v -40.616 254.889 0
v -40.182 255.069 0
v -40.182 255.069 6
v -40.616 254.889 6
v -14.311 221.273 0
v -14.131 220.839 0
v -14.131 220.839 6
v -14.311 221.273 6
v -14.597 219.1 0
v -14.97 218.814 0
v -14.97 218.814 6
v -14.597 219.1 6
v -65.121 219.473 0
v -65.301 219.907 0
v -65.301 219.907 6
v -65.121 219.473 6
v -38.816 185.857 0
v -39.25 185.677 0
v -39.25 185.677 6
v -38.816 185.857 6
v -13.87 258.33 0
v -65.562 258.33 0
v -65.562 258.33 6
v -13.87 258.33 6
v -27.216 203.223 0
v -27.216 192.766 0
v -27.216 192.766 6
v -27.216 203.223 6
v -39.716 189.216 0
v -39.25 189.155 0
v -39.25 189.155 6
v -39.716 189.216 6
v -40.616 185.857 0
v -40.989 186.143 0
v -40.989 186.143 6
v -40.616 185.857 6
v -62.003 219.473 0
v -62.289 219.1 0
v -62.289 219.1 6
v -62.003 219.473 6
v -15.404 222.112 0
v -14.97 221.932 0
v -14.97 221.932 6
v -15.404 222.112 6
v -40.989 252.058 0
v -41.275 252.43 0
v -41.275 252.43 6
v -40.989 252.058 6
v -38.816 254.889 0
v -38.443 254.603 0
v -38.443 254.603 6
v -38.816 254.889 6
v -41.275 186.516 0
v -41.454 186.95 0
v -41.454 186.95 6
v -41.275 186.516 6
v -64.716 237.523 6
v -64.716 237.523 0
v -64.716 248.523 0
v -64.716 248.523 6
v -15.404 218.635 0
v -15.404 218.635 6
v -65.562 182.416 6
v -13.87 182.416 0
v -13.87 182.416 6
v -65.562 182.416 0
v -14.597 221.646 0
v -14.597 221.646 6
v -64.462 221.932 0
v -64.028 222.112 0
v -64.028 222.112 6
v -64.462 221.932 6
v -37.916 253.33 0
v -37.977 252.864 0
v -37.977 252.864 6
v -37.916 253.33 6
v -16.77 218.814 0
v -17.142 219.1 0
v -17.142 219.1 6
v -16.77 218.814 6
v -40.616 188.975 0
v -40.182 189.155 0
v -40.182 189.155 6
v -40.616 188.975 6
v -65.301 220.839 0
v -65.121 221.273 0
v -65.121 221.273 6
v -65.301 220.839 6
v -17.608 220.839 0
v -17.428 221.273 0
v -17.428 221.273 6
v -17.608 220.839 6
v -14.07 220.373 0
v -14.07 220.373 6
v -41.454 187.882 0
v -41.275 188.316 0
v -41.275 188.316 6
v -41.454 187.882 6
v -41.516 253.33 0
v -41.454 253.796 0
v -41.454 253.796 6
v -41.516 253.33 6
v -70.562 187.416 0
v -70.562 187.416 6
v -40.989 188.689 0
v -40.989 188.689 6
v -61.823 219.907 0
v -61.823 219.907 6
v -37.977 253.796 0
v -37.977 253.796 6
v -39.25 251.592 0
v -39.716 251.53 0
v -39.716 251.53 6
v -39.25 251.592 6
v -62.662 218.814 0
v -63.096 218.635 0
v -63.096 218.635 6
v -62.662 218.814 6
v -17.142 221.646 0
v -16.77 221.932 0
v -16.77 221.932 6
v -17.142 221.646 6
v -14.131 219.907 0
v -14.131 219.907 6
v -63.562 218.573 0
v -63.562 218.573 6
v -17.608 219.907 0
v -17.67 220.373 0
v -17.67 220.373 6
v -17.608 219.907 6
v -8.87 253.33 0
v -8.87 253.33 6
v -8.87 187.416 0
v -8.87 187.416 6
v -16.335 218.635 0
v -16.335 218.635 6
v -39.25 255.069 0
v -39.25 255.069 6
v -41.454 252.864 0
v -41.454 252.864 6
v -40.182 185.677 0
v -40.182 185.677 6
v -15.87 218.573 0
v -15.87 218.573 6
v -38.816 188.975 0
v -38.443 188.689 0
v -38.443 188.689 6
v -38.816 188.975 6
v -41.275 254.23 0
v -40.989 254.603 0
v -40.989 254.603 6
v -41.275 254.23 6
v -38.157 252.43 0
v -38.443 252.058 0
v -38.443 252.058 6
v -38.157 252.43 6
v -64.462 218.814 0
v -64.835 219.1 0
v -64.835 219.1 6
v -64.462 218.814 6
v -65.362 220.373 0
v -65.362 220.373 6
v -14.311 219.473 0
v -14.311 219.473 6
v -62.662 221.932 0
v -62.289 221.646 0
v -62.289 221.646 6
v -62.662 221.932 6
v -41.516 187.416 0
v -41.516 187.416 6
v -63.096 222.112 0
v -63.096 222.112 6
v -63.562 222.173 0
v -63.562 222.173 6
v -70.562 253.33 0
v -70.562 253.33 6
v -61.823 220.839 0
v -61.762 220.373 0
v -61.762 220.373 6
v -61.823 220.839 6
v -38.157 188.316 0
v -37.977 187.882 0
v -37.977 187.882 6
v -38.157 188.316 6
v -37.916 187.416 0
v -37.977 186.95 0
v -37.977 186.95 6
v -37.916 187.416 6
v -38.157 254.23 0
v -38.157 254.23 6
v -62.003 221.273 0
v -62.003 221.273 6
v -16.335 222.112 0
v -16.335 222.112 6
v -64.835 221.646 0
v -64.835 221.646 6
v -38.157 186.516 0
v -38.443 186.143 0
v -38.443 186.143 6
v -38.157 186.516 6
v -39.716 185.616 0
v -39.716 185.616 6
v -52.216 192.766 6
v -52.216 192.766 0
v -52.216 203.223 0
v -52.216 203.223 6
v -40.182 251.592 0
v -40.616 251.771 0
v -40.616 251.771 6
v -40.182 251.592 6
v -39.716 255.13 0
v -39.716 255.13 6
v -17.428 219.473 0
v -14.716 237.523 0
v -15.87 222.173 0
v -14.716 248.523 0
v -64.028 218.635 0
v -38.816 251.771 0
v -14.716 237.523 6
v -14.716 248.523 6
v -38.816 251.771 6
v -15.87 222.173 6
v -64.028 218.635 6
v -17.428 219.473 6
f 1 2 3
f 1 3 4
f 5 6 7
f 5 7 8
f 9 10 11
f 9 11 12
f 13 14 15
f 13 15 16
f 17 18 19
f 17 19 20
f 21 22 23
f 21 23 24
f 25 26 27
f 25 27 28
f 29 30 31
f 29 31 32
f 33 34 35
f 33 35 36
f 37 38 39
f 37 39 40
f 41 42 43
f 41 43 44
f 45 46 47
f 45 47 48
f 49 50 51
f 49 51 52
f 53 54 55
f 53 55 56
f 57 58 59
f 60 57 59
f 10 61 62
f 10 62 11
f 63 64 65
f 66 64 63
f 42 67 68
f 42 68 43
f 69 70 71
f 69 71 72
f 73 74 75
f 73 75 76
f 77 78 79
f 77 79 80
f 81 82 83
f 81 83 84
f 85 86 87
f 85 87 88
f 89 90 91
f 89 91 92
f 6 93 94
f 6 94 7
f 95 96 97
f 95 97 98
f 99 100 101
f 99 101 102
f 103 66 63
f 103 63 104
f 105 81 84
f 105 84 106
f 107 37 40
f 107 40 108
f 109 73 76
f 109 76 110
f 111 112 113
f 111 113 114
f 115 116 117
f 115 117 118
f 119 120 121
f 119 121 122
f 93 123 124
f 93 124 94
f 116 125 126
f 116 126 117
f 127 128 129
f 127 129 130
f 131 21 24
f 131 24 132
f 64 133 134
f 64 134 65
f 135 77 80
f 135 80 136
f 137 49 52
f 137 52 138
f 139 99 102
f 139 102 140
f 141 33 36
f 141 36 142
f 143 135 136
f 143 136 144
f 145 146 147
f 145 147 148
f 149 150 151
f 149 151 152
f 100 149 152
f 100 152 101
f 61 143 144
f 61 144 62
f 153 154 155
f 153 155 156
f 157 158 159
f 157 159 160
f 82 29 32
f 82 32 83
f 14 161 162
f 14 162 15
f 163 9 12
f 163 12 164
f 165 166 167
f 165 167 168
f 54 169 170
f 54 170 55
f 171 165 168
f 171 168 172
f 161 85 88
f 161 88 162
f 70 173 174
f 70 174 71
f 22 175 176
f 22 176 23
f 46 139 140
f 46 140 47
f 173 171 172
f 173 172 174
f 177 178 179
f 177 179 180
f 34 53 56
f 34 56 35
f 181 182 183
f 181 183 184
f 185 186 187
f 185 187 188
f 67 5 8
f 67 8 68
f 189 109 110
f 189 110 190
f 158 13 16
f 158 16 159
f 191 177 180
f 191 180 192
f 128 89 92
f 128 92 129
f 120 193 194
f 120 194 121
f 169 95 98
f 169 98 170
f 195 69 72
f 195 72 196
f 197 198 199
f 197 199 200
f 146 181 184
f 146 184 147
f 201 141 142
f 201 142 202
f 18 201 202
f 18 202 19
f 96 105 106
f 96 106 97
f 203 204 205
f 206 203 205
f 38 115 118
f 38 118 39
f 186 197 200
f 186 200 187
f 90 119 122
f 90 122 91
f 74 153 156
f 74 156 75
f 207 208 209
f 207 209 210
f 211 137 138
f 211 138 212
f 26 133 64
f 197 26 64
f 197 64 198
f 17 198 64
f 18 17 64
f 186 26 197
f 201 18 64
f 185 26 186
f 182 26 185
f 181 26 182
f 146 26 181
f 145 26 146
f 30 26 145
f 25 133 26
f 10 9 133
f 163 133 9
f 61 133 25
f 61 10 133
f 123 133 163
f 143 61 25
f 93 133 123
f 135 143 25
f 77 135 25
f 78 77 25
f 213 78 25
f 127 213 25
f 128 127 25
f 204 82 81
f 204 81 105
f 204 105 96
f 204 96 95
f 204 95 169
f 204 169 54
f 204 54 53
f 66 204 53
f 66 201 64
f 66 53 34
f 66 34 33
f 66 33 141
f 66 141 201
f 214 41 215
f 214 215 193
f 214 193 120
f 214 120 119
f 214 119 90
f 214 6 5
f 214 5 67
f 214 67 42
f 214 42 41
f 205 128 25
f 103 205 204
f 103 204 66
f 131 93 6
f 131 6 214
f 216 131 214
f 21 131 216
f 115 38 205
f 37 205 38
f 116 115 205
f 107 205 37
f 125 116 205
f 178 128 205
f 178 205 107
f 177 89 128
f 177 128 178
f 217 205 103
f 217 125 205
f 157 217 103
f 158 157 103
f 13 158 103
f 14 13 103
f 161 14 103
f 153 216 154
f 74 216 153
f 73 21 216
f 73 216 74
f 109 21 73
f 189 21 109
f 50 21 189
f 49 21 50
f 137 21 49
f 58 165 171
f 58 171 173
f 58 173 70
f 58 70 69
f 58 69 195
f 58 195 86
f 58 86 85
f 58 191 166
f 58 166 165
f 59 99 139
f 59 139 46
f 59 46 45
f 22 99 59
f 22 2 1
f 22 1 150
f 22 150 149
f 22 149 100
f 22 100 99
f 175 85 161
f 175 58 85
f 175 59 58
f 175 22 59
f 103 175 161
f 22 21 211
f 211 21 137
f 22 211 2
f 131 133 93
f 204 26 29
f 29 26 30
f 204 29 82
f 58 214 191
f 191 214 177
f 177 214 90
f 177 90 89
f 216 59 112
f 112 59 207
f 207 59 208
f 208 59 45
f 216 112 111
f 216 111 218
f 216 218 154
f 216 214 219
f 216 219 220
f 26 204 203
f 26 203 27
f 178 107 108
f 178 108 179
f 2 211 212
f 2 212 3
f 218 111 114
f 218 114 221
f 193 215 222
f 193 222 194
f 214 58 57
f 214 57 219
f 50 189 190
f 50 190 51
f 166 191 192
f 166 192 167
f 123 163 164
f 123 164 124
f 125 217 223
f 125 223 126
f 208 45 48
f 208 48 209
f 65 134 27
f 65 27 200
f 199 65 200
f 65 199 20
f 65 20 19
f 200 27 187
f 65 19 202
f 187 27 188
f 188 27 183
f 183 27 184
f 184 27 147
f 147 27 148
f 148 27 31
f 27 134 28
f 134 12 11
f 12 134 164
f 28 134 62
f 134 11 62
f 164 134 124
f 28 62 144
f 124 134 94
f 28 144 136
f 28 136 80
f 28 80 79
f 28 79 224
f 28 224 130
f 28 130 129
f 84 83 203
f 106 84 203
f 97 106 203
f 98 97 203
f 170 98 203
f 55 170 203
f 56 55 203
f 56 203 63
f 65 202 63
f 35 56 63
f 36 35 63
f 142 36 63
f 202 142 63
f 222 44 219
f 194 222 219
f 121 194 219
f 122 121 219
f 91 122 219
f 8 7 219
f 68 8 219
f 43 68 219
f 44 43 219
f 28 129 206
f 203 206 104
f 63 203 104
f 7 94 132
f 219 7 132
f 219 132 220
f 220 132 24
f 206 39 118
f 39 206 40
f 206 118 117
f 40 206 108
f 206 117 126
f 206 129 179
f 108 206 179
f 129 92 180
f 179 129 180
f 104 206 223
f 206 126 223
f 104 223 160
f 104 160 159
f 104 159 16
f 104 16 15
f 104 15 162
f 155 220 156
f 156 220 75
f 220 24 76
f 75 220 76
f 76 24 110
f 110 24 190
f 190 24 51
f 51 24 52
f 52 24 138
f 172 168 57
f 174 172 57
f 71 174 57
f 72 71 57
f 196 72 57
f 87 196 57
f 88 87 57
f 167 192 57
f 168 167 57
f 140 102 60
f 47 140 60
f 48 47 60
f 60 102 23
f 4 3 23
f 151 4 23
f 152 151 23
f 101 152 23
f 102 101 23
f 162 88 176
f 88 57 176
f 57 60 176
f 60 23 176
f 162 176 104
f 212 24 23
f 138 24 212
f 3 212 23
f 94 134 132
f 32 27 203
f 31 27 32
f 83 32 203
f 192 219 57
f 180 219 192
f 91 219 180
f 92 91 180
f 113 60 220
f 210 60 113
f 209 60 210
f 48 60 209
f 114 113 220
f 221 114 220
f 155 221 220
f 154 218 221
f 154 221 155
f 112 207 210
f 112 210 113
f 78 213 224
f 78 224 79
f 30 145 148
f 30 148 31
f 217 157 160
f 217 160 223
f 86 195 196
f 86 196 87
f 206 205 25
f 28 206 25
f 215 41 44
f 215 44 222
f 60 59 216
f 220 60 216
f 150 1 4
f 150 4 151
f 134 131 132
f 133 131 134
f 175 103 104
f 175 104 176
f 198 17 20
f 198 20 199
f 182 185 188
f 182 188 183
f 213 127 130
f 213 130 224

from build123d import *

# Parameters (mm, degrees)
SKETCH1_W           = 24.999989911
SKETCH1_H           = 10.457138346
SKETCH1_W_2         = 49.999979698
SKETCH1_H_2         = 10.999995004
BOSS_EXTRUDE1_DEPTH = 6


with BuildPart() as part:
    # Sketch1 → Boss-Extrude1 (new body)
    with BuildSketch(Plane.XY):
        Polygon((-13.869587182, 182.416079474), (-65.562023318, 182.416079474), (-70.562021318, 187.416077474), (-70.562021318, 253.330336135), (-65.562023318, 258.330334135), (-13.869587203, 258.330334135), (-8.86958931, 253.330336243), (-8.869589201, 187.416077455), align=None)
        with Locations((-39.715805198, 197.994644352)):
            Rectangle(SKETCH1_W, SKETCH1_H, mode=Mode.SUBTRACT)
        with Locations((-39.71580491, 243.023197048)):
            Rectangle(SKETCH1_W_2, SKETCH1_H_2, mode=Mode.SUBTRACT)
        Polygon((-64.027895433, 218.634541052), (-63.562021338, 218.573207564), (-63.096147243, 218.634541052), (-62.662021698, 218.81436174), (-62.289229641, 219.100415147), (-62.003176235, 219.473207204), (-61.823355546, 219.907332749), (-61.762022058, 220.373206844), (-61.823355546, 220.839080938), (-62.003176235, 221.273206484), (-62.289229641, 221.645998541), (-62.662021698, 221.932051947), (-63.096147243, 222.111872635), (-63.562021338, 222.173206124), (-64.027895433, 222.111872635), (-64.462020978, 221.932051947), (-64.834813035, 221.645998541), (-65.120866442, 221.273206484), (-65.30068713, 220.839080938), (-65.362020618, 220.373206844), (-65.30068713, 219.907332749), (-65.120866442, 219.473207204), (-64.834813035, 219.100415147), (-64.462020978, 218.81436174), align=None, mode=Mode.SUBTRACT)
        Polygon((-15.869589261, 222.173206124), (-16.335463356, 222.111872635), (-16.769588901, 221.932051947), (-17.142380958, 221.645998541), (-17.428434364, 221.273206484), (-17.608255053, 220.839080938), (-17.669588541, 220.373206844), (-17.608255053, 219.907332749), (-17.428434364, 219.473207204), (-17.142380958, 219.100415147), (-16.769588901, 218.81436174), (-16.335463356, 218.634541052), (-15.869589261, 218.573207564), (-15.403715166, 218.634541052), (-14.969589621, 218.81436174), (-14.596797564, 219.100415147), (-14.310744158, 219.473207204), (-14.130923469, 219.907332749), (-14.069589981, 220.373206844), (-14.130923469, 220.839080938), (-14.310744158, 221.273206484), (-14.596797564, 221.645998541), (-14.969589621, 221.932051947), (-15.403715166, 222.111872635), align=None, mode=Mode.SUBTRACT)
        Polygon((-37.977139428, 187.881953608), (-38.156960116, 188.316079153), (-38.443013523, 188.68887121), (-38.81580558, 188.974924616), (-39.249931125, 189.154745305), (-39.71580522, 189.216078793), (-40.181679314, 189.154745305), (-40.61580486, 188.974924616), (-40.988596917, 188.68887121), (-41.274650323, 188.316079153), (-41.454471012, 187.881953608), (-41.5158045, 187.416079513), (-41.454471012, 186.950205418), (-41.274650323, 186.516079873), (-40.988596917, 186.143287816), (-40.61580486, 185.857234409), (-40.181679314, 185.677413721), (-39.71580522, 185.616080233), (-39.249931125, 185.677413721), (-38.81580558, 185.857234409), (-38.443013523, 186.143287816), (-38.156960116, 186.516079873), (-37.977139428, 186.950205418), (-37.91580594, 187.416079513), align=None, mode=Mode.SUBTRACT)
        Polygon((-37.977139428, 252.86446006), (-37.91580594, 253.330334155), (-37.977139428, 253.79620825), (-38.156960116, 254.230333795), (-38.443013523, 254.603125852), (-38.81580558, 254.889179258), (-39.249931125, 255.068999947), (-39.71580522, 255.130333435), (-40.181679314, 255.068999947), (-40.61580486, 254.889179258), (-40.988596917, 254.603125852), (-41.274650323, 254.230333795), (-41.454471012, 253.79620825), (-41.5158045, 253.330334155), (-41.454471012, 252.86446006), (-41.274650323, 252.430334515), (-40.988596917, 252.057542458), (-40.61580486, 251.771489052), (-40.181679314, 251.591668363), (-39.71580522, 251.530334875), (-39.249931125, 251.591668363), (-38.81580558, 251.771489052), (-38.443013523, 252.057542458), (-38.156960116, 252.430334515), align=None, mode=Mode.SUBTRACT)
    extrude(amount=BOSS_EXTRUDE1_DEPTH)


solid = part.part
